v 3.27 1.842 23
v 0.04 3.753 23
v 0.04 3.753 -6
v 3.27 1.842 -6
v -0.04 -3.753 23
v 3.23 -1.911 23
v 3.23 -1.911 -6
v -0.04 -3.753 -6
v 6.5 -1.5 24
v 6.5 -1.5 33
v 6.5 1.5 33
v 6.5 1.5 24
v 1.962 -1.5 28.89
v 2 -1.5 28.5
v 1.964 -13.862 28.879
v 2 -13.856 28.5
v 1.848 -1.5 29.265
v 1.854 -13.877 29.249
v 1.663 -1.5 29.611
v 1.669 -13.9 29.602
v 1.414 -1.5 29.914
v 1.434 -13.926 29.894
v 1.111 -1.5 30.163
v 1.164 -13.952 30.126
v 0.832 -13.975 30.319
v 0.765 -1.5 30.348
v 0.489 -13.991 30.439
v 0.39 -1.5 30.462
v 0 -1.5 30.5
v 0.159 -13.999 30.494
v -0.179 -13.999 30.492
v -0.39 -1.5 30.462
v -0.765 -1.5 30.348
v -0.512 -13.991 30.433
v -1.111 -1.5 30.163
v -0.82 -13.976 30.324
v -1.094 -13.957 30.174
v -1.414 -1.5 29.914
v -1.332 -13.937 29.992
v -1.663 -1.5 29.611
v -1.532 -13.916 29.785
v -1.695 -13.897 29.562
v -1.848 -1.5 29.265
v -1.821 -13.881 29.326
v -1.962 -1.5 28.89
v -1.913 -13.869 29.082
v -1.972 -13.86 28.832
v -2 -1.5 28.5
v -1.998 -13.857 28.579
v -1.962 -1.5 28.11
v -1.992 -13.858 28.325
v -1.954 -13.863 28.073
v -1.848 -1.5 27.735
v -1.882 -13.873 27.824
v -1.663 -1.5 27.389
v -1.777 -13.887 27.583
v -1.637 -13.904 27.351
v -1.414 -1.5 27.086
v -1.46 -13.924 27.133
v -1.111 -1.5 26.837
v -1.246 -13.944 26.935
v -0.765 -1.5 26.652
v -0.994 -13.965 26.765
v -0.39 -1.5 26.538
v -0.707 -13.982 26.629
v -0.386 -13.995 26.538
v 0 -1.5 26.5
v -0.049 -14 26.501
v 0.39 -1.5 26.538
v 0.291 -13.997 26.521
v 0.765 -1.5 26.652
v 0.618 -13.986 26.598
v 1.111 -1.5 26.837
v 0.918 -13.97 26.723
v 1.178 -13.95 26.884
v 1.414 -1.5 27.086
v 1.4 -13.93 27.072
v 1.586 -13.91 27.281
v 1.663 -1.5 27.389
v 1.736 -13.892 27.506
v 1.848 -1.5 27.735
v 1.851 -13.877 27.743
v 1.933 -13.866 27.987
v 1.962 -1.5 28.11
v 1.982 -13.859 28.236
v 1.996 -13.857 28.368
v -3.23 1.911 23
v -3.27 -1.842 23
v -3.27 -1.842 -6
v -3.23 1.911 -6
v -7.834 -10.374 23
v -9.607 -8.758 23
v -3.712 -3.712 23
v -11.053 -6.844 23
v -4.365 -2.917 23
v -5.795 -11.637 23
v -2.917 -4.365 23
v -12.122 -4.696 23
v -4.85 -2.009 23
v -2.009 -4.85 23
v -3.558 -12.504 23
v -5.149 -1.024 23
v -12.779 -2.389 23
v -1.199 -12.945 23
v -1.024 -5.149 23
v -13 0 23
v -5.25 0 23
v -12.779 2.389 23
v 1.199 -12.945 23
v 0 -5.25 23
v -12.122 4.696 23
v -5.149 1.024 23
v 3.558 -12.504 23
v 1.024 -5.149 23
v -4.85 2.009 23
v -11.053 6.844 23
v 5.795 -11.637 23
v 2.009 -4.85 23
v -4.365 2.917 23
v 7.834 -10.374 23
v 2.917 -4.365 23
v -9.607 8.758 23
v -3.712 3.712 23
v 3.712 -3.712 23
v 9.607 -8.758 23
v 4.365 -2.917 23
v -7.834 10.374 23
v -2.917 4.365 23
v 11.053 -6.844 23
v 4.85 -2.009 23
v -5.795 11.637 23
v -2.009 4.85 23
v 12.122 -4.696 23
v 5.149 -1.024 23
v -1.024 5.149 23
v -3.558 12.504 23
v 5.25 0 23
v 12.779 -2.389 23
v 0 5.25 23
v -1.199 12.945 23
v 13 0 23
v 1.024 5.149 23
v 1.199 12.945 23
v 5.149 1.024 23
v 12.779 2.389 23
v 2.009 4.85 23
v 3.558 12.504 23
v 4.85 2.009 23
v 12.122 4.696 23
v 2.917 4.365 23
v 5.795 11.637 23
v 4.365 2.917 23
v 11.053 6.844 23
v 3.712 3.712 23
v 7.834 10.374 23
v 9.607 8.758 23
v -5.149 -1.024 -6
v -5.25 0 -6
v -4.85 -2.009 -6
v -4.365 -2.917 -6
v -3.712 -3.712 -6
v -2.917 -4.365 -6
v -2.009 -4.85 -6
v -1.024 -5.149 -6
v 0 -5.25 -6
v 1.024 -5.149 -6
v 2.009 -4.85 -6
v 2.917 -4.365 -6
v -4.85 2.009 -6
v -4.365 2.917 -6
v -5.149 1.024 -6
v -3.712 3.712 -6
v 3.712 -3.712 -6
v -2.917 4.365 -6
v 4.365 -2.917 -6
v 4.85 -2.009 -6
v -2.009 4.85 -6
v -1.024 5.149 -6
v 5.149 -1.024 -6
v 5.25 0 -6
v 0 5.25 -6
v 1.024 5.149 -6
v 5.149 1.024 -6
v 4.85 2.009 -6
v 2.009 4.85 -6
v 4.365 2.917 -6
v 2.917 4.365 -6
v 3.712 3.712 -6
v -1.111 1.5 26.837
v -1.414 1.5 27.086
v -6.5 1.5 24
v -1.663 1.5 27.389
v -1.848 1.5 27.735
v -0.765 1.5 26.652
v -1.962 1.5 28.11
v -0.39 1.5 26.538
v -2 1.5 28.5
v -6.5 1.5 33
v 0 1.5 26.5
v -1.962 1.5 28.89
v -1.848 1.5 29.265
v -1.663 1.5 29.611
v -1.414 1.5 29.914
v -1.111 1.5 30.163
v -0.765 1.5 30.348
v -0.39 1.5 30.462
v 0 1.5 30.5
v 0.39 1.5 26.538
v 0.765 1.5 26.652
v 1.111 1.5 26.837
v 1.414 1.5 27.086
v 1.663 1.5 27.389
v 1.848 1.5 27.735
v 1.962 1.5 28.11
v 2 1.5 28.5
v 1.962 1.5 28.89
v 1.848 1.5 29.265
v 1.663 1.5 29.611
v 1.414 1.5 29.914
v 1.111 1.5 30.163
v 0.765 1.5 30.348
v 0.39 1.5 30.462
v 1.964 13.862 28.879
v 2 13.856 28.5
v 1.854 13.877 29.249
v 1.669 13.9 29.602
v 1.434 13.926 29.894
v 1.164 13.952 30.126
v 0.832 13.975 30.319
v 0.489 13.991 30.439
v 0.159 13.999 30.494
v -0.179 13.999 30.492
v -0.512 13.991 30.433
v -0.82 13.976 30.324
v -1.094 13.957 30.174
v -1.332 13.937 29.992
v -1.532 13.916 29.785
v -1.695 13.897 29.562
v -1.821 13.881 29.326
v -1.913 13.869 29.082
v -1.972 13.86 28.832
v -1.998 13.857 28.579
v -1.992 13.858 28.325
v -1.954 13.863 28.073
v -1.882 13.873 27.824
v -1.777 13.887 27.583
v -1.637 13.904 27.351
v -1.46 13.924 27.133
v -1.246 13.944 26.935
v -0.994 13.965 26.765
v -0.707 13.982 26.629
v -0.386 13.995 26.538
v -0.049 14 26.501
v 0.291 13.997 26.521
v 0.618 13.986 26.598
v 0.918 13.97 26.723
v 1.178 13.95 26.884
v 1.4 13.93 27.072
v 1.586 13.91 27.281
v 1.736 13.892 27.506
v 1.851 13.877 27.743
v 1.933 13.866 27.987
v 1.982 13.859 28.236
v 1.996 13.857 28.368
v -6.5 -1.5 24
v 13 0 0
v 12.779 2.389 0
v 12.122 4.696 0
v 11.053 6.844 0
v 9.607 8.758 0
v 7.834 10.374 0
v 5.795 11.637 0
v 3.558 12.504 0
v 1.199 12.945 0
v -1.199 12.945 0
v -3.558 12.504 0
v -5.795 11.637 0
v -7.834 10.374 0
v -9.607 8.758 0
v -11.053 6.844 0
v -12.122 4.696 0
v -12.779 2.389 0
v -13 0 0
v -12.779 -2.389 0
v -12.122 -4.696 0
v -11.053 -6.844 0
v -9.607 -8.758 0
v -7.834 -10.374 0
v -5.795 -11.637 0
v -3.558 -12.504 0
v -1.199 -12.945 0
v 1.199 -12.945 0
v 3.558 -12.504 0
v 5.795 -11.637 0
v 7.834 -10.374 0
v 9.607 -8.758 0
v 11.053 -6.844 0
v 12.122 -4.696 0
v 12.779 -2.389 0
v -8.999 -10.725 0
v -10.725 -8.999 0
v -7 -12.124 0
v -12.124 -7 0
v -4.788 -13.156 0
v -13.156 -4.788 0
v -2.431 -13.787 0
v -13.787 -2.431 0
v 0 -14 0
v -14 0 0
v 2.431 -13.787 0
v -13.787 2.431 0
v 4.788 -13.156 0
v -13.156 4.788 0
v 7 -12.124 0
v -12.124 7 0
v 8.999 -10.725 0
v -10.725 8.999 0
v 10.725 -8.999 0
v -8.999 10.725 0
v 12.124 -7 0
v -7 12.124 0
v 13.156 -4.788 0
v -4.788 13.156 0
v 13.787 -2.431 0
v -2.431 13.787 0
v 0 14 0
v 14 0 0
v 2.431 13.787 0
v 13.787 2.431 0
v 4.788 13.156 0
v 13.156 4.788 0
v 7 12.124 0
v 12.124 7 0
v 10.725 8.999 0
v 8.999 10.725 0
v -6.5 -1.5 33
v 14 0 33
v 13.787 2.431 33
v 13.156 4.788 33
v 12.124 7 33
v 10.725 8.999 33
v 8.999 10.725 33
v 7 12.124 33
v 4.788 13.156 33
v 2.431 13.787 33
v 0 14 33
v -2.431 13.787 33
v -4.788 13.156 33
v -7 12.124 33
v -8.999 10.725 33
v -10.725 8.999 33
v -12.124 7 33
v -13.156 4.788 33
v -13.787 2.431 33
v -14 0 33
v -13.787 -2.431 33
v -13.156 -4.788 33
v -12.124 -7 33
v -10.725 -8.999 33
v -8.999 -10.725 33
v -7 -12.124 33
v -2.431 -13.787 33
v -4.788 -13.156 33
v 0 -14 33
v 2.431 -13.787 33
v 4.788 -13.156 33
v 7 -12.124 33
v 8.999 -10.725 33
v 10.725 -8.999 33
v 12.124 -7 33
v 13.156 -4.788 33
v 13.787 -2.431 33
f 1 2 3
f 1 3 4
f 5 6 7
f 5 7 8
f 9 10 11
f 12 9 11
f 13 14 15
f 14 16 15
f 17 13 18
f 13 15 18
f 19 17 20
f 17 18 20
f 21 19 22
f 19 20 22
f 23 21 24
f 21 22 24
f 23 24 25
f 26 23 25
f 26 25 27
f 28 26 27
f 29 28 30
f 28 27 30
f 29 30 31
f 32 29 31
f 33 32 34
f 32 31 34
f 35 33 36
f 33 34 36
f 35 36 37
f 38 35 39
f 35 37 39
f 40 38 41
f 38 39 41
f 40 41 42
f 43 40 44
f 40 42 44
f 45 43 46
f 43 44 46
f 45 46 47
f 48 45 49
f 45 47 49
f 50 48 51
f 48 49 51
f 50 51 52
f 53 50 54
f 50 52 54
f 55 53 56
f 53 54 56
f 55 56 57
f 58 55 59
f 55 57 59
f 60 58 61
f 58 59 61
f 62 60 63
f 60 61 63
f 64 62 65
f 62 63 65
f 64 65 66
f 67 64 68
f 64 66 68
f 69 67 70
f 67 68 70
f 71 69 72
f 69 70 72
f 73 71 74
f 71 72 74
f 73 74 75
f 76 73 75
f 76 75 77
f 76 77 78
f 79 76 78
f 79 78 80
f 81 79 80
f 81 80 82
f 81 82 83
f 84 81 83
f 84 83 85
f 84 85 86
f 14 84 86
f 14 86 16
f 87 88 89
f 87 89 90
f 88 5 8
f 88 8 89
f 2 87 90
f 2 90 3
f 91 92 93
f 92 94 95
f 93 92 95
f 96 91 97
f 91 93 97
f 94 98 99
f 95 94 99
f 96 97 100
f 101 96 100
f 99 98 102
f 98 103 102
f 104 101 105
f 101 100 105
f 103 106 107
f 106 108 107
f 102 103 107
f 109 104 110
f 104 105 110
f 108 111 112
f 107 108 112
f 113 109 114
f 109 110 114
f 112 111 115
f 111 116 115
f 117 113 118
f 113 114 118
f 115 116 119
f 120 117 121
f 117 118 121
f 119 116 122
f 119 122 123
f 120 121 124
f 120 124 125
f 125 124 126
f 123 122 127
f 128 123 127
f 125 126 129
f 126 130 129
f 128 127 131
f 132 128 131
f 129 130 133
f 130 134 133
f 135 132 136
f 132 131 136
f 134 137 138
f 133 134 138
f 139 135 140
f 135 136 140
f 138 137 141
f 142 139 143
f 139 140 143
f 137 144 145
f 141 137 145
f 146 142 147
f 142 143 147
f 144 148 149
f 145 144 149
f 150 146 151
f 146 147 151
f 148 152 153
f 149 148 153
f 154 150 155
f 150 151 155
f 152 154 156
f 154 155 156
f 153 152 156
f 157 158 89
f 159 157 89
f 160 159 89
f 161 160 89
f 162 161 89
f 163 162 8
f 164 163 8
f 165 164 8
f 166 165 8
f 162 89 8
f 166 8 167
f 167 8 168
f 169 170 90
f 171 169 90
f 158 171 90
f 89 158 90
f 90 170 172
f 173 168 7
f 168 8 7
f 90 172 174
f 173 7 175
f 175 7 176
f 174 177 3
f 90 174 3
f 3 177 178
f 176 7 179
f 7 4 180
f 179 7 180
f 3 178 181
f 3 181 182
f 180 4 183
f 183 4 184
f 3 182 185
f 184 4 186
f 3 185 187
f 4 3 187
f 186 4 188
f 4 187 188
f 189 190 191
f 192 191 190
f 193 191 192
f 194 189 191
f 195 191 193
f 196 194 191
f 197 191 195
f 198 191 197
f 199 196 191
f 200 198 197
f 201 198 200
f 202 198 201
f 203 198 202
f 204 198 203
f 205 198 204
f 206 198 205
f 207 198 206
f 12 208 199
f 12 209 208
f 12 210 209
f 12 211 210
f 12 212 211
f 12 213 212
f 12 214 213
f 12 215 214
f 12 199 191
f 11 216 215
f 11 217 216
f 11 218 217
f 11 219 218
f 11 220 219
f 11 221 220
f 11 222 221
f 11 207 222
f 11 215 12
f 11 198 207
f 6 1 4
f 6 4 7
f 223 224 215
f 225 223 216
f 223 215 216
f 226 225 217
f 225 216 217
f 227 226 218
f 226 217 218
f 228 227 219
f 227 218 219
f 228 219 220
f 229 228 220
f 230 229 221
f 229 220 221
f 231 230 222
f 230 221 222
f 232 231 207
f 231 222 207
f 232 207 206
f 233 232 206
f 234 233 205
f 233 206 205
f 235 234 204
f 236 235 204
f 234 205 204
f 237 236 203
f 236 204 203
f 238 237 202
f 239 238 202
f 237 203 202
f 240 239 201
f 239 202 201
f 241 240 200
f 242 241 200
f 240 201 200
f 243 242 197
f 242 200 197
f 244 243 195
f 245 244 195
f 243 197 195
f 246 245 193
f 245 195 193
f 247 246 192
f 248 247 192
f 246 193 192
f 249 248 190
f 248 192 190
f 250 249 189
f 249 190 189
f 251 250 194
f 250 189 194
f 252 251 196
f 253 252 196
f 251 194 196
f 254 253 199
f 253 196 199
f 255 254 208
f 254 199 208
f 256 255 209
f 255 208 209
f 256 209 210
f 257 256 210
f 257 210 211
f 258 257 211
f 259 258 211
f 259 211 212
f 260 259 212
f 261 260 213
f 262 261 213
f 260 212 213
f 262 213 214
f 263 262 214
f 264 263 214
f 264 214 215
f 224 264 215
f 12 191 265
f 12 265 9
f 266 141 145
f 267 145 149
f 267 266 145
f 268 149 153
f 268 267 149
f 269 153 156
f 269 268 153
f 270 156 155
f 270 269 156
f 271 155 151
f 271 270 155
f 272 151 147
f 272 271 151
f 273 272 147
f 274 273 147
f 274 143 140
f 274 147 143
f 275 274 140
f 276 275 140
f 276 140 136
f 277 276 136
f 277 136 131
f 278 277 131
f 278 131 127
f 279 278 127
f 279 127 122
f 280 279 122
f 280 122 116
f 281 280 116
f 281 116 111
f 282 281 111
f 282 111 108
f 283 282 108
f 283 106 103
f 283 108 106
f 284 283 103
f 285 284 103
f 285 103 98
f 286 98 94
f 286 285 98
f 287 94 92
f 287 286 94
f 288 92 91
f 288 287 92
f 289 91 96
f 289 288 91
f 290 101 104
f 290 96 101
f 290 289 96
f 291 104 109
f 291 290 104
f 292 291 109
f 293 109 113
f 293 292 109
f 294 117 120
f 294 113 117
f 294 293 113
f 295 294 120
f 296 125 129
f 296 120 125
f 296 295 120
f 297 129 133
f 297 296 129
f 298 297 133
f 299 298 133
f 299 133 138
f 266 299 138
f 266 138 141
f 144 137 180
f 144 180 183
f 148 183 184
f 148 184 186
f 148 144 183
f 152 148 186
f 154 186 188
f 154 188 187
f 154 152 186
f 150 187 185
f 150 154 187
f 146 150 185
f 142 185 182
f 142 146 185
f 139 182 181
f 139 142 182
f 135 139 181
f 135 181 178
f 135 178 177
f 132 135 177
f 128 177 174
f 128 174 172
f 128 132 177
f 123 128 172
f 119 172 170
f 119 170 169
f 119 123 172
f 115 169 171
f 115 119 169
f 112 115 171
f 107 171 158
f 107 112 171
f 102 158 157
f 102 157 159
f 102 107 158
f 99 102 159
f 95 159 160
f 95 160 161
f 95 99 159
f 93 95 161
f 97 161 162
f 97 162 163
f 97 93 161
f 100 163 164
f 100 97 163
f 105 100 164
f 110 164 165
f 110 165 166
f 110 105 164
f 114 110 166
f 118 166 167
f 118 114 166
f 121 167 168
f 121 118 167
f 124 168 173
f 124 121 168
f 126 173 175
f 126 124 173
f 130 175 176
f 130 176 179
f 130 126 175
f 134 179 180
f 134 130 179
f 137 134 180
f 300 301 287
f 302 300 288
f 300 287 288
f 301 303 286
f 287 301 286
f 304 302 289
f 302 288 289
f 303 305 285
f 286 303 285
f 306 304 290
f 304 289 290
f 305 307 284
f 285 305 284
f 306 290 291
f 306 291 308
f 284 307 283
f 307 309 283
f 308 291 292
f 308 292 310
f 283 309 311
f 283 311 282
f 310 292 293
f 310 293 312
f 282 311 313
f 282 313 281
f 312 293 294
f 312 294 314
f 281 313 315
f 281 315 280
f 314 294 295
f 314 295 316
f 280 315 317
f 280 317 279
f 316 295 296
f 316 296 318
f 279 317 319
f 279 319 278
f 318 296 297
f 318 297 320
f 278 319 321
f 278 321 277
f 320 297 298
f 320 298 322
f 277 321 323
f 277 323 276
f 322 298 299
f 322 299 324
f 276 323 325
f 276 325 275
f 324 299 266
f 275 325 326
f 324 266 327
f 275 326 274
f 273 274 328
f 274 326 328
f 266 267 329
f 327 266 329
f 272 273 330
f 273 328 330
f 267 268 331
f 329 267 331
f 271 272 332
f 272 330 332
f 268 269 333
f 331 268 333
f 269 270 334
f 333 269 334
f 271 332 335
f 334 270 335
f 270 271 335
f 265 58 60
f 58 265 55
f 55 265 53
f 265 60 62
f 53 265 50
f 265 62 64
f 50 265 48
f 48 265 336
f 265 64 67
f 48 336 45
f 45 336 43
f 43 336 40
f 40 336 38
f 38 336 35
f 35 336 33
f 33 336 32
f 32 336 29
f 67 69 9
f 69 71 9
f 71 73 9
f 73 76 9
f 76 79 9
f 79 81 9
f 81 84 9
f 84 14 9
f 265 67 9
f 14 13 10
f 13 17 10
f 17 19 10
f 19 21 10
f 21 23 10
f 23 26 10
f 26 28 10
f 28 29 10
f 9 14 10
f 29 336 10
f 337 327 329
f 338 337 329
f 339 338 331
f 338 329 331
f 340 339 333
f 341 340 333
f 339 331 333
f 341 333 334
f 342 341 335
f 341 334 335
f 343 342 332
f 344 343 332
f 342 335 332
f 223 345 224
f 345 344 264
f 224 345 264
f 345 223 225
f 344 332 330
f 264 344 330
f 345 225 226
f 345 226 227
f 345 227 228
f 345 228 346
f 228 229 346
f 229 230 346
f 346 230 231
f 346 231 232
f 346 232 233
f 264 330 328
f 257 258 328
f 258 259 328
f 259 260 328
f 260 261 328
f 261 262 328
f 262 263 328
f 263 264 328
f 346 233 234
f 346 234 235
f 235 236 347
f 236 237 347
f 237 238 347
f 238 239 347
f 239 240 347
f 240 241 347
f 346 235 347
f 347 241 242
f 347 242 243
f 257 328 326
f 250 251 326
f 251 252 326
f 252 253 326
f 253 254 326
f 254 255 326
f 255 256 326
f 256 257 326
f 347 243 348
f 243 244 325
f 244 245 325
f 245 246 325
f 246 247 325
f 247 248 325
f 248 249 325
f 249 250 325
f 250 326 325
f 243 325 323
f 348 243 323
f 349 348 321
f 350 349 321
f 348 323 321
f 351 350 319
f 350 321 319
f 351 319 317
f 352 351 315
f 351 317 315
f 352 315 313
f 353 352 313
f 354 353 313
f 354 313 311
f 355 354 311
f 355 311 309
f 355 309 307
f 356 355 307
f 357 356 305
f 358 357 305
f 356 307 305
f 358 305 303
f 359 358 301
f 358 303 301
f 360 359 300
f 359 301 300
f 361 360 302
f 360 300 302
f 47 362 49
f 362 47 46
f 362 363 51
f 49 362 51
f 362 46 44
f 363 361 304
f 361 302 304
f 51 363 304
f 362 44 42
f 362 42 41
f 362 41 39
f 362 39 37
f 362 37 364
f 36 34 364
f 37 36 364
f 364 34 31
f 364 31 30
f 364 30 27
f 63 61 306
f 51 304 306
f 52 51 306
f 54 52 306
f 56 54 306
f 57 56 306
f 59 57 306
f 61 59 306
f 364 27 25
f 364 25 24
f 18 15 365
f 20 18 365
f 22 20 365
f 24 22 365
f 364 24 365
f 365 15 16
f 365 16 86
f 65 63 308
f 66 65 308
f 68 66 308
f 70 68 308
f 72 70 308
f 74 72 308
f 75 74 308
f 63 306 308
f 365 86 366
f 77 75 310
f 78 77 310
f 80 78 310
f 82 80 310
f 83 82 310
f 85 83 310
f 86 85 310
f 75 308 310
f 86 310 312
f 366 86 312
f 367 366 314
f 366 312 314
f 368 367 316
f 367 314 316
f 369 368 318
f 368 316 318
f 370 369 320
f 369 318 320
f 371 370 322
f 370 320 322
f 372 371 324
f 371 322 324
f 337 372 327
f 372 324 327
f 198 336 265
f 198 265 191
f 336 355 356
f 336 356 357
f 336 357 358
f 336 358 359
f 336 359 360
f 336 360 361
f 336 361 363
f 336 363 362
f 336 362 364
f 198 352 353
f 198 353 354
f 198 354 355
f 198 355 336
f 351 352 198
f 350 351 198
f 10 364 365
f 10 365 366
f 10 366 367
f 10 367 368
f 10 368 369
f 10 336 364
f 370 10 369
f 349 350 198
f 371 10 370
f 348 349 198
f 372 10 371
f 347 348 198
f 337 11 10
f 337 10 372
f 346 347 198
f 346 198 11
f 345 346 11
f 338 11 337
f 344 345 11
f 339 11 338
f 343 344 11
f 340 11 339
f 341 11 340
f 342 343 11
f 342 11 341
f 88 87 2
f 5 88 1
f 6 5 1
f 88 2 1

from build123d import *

# Parameters (mm, degrees)
F0_R      = 14
F0_R_2    = 13
F0_R_3    = 5.25
F1_DEPTH  = 33
F2_DEPTH  = 6
F3_R      = 14
F3_R_2    = 5.25
F4_DEPTH  = 10
F7_W      = 13
F7_H      = 3
F8_DEPTH  = 9
F9_R      = 2
F10_DEPTH = 16


with BuildPart() as f1:
    # F0 (on Top) → F1 (new body)
    with BuildSketch(Plane.XY):
        Circle(F0_R)
        Circle(F0_R_2, mode=Mode.SUBTRACT)
        Circle(F0_R_3)
        Polygon((-3.229793, 1.910961), (0.040044, 3.752563), (3.269837, 1.841602), (3.229793, -1.910961), (-0.040044, -3.752563), (-3.269837, -1.841602), align=None, mode=Mode.SUBTRACT)
    extrude(amount=F1_DEPTH)

    # F0 (on Top) → F2 (join)
    with BuildSketch(Plane.XY):
        Circle(F0_R_3)
        Polygon((-3.229793, 1.910961), (0.040044, 3.752563), (3.269837, 1.841602), (3.229793, -1.910961), (-0.040044, -3.752563), (-3.269837, -1.841602), align=None, mode=Mode.SUBTRACT)
    extrude(amount=-F2_DEPTH)


with BuildPart() as f4:
    # F3 (on face) → F4 (new body)
    with BuildSketch(Plane.XY.offset(33)):
        Circle(F3_R)
        Circle(F3_R_2, mode=Mode.SUBTRACT)
        Polygon((-3.229793, 1.910961), (-3.269837, -1.841602), (-0.040044, -3.752563), (3.229793, -1.910961), (3.269837, 1.841602), (0.040044, 3.752563), align=None)
    extrude(amount=-F4_DEPTH)


with BuildPart() as f1_1:
    add(f1.part)

    # F5: union F4
    add(f4.part)

    # F6: union 

    # F7 (on face) → F8 (cut)
    with BuildSketch(Plane.XY.offset(33)):
        Rectangle(F7_W, F7_H)
    extrude(amount=-F8_DEPTH, mode=Mode.SUBTRACT)

    # F9 (on face) → F10 (cut, symmetric)
    with BuildSketch(Plane.XZ.offset(-1.5)):
        with Locations((0, 28.5)):
            Circle(F9_R)
    extrude(amount=F10_DEPTH, both=True, mode=Mode.SUBTRACT)


solid = f1_1.part
